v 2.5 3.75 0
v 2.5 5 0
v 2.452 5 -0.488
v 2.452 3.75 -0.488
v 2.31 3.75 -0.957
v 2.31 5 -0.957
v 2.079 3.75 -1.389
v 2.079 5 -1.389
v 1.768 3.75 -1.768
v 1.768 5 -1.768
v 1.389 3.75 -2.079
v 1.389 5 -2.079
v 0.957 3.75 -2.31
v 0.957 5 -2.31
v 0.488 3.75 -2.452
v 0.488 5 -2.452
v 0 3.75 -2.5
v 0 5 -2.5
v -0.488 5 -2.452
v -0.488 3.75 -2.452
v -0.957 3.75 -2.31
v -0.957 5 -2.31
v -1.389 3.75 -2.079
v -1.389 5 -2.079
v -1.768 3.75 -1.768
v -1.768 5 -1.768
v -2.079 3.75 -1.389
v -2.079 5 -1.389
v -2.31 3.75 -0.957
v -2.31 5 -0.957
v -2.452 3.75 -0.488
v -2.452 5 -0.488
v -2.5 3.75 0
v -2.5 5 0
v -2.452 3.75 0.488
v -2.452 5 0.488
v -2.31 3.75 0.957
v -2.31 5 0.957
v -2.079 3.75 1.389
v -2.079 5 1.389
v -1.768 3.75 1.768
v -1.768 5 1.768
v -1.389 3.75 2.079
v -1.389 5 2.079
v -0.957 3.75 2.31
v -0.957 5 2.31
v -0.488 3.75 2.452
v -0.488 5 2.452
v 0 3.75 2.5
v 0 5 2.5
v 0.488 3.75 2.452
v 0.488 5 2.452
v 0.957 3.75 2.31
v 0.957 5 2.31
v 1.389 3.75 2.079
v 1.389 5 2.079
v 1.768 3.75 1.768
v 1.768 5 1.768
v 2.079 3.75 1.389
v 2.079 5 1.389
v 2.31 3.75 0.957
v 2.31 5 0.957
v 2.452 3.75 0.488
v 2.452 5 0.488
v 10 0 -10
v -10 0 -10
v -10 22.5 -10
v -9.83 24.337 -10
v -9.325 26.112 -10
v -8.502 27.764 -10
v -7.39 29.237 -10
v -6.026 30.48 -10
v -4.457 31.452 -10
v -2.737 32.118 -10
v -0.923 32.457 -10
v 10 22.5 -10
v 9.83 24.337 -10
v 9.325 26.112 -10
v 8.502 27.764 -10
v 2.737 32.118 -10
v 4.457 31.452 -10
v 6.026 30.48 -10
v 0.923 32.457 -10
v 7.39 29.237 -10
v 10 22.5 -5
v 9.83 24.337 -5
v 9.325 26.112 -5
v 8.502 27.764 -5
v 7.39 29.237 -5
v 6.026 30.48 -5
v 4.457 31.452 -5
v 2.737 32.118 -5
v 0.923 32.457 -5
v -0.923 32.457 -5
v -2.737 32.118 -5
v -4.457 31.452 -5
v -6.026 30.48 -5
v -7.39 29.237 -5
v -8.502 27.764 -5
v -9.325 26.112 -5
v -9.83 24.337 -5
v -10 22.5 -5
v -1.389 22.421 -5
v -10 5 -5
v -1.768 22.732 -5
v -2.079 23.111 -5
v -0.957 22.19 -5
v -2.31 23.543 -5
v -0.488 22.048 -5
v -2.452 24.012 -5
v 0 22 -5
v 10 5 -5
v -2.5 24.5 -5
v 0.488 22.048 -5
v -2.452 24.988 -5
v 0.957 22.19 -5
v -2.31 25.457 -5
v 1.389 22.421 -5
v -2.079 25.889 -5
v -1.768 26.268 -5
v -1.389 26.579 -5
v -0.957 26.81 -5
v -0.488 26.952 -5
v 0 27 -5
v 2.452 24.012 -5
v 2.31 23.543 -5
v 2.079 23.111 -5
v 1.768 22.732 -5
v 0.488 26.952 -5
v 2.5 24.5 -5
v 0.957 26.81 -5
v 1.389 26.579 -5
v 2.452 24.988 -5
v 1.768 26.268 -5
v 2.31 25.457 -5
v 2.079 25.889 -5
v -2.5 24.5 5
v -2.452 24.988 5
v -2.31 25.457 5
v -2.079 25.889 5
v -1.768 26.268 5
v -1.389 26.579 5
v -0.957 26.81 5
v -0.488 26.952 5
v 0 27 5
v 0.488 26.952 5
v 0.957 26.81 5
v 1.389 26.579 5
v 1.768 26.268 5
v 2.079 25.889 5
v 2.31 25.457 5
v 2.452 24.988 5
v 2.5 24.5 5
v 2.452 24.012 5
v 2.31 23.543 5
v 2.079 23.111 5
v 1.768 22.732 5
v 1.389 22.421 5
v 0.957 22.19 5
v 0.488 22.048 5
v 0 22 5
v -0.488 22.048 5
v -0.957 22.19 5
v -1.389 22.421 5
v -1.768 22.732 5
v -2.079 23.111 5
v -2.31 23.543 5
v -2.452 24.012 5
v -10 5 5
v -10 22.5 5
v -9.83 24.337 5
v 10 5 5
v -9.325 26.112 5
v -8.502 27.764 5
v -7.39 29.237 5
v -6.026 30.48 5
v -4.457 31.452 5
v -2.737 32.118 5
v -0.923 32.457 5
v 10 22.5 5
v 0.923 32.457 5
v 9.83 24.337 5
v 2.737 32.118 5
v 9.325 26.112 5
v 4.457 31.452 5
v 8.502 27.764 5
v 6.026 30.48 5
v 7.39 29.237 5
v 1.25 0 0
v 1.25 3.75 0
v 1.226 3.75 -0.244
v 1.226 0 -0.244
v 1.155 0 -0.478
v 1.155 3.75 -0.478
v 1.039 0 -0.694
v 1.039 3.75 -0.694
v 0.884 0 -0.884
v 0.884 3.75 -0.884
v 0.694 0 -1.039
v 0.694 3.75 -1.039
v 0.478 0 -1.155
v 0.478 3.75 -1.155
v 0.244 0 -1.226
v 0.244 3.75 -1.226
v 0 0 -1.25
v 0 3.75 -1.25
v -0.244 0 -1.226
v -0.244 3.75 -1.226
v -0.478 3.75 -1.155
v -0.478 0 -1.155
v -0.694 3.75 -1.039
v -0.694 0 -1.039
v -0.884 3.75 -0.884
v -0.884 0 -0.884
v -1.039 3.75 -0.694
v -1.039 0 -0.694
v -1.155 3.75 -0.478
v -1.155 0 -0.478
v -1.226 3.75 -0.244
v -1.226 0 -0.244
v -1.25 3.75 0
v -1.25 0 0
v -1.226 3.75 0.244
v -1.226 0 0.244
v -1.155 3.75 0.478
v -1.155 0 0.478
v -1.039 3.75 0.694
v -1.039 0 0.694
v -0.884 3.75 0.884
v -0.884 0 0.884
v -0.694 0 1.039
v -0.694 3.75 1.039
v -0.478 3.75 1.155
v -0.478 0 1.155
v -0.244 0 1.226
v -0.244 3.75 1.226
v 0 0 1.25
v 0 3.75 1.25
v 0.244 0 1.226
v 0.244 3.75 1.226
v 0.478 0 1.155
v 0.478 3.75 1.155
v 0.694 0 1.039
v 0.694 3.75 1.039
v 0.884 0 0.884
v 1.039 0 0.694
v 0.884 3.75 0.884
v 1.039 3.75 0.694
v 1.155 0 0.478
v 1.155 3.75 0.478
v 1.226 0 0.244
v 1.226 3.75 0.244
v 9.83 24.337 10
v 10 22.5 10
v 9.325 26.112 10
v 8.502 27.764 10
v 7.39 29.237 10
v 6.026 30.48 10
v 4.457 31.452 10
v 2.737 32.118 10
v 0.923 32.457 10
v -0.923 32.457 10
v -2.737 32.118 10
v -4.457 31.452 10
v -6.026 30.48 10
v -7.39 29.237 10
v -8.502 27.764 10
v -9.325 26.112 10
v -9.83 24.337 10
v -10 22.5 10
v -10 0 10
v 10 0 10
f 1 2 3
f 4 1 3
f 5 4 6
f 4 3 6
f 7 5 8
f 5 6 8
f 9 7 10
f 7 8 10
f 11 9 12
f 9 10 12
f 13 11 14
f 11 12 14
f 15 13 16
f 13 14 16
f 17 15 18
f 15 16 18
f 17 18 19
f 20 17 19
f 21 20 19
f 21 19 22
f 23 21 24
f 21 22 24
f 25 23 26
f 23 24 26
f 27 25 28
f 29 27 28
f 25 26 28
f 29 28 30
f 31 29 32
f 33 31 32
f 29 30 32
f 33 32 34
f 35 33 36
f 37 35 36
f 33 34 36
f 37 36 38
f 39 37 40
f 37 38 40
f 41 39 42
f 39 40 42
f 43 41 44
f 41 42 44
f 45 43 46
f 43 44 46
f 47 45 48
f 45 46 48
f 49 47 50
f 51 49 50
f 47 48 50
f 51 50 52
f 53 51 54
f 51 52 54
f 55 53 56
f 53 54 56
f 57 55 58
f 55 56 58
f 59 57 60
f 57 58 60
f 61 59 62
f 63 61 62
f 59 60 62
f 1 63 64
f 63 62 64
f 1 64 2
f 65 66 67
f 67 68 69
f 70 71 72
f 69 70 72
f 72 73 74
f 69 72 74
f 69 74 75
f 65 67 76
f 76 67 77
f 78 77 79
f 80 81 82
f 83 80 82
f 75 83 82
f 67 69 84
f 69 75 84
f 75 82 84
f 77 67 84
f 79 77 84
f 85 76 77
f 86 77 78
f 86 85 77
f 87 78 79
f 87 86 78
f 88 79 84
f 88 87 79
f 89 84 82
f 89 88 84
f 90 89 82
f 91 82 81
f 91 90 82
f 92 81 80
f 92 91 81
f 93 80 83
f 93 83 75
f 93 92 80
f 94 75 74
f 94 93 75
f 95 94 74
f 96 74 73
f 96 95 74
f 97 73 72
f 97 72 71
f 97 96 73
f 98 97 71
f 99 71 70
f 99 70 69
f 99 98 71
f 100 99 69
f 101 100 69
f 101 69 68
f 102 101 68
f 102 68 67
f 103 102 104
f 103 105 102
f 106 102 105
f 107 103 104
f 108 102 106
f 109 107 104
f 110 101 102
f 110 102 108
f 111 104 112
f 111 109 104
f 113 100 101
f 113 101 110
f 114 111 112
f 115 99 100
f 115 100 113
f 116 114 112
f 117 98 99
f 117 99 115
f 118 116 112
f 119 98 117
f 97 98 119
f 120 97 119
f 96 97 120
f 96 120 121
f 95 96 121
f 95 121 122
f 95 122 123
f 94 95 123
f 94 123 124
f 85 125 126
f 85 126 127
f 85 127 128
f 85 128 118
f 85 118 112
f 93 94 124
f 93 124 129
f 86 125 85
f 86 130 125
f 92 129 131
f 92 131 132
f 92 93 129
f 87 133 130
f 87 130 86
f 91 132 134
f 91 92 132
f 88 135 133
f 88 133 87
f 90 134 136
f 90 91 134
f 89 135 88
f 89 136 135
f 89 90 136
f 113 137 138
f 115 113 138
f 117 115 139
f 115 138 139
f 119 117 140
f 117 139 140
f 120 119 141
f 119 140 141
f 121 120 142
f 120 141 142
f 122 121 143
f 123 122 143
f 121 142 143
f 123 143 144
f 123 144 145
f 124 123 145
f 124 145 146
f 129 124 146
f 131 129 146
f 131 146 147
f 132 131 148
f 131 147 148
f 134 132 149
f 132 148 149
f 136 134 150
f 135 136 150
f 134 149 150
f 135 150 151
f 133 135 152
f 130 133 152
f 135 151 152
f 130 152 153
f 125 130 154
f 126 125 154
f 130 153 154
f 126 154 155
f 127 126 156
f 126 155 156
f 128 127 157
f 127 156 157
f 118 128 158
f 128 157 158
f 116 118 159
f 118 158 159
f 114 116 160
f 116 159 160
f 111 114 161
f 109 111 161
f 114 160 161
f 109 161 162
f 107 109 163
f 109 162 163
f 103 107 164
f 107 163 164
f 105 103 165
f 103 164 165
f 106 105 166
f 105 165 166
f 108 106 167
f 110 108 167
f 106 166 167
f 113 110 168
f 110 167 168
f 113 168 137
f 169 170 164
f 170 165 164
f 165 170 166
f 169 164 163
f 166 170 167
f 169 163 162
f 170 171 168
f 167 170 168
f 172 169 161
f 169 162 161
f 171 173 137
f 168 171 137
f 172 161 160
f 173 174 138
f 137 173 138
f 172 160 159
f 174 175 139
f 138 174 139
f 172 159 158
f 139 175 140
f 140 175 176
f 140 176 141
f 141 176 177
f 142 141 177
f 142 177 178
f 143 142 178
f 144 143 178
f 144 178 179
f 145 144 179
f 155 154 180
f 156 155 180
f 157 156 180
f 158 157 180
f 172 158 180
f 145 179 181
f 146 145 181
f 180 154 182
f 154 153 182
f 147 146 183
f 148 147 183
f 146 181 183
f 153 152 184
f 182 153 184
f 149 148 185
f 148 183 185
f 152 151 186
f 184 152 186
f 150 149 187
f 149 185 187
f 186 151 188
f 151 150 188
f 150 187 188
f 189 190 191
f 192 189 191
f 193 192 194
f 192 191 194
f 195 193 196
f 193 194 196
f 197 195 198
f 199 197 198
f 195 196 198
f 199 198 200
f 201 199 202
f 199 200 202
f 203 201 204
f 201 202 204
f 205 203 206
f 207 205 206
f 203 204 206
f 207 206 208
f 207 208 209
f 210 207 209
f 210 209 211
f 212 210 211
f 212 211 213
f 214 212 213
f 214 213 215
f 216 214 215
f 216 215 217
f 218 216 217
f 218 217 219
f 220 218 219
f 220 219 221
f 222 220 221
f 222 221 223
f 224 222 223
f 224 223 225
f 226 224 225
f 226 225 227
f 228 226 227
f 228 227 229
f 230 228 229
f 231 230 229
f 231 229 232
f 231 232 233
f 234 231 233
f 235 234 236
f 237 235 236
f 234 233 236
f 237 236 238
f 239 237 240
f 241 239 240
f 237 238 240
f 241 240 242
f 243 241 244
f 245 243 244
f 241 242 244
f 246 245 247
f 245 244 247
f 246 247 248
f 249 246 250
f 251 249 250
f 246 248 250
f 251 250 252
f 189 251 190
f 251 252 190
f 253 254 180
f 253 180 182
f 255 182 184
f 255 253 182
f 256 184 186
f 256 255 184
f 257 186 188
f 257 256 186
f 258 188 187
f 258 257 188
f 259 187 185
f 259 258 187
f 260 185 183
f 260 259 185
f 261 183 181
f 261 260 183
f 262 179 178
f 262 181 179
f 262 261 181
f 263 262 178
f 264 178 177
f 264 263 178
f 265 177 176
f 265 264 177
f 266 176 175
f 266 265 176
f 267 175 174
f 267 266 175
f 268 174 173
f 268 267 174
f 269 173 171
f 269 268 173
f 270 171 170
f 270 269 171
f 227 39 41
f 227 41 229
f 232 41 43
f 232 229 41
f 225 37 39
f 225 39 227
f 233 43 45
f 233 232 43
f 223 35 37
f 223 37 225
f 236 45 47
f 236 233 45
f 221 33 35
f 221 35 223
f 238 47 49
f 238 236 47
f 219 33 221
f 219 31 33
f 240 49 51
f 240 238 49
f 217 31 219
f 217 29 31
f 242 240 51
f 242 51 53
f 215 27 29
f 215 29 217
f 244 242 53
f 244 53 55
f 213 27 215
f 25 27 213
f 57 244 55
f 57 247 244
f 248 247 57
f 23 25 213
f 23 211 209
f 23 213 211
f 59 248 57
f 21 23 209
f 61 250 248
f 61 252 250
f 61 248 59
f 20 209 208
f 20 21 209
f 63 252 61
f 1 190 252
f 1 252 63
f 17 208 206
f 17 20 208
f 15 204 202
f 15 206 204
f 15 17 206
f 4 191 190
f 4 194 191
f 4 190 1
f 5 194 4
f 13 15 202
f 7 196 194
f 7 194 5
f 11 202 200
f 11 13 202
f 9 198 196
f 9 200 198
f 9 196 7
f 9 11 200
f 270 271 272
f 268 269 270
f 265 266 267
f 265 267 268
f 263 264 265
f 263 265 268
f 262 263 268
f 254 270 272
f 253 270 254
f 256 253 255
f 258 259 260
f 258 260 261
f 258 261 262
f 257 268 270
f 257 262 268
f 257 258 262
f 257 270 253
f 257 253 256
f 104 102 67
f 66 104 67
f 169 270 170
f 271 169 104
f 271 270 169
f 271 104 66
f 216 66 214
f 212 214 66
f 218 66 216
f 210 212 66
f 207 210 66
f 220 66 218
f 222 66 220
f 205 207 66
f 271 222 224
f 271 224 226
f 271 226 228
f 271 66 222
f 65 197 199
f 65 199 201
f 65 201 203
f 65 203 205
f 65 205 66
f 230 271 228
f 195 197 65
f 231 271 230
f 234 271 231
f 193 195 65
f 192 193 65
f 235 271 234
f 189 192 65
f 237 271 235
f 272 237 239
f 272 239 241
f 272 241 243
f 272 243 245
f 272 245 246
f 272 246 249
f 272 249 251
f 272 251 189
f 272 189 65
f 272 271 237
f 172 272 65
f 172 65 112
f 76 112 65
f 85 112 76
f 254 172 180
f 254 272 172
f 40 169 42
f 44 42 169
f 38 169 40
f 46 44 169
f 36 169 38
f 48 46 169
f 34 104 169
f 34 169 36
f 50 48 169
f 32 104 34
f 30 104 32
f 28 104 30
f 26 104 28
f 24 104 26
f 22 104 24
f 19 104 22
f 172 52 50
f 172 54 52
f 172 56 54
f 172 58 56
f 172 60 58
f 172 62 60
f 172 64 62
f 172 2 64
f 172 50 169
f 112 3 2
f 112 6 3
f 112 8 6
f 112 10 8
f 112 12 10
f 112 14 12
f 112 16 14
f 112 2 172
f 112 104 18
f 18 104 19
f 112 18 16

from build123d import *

# Parameters (mm, degrees)
BOSS_EXTRUDE1_DEPTH = 10
SKETCH3_W           = 20
SKETCH3_H           = 10
CUT_EXTRUDE2_DEPTH  = 27.5
SKETCH4_R           = 2.5
BOSS_EXTRUDE2_DEPTH = 10
SKETCH5_R           = 1.25
CUT_EXTRUDE4_DEPTH  = 10
SKETCH6_R           = 2.5
CUT_EXTRUDE5_DEPTH  = 1.25


with BuildPart() as part:
    # Sketch1 → Boss-Extrude1 (new body, symmetric)
    with BuildSketch(Plane.XY):
        with BuildLine():
            Line((-10, 22.5), (-10, 0))
            Line((-10, 0), (10, 0))
            Line((10, 0), (10, 22.5))
            ThreePointArc((10, 22.5), (0, 32.5), (-10, 22.5))
        make_face()
    extrude(amount=BOSS_EXTRUDE1_DEPTH, both=True)

    # Sketch3 → Cut-Extrude2 (cut)
    with BuildSketch(Plane(origin=(0, 32.5, 0), x_dir=(1, 0, 0), z_dir=(0, 1, 0))):
        Rectangle(SKETCH3_W, SKETCH3_H)
    extrude(amount=-CUT_EXTRUDE2_DEPTH, mode=Mode.SUBTRACT)

    # Sketch4 → Boss-Extrude2 (add)
    with BuildSketch(Plane(origin=(0, 0, 5), x_dir=(-1, 0, 0), z_dir=(0, 0, -1))):
        with Locations((0, 24.5)):
            Circle(SKETCH4_R)
    extrude(amount=BOSS_EXTRUDE2_DEPTH)

    # Sketch5 → Cut-Extrude4 (cut)
    with BuildSketch(Plane(origin=(0, 5, 0), x_dir=(1, 0, 0), z_dir=(0, 1, 0))):
        Circle(SKETCH5_R)
    extrude(amount=-CUT_EXTRUDE4_DEPTH, mode=Mode.SUBTRACT)

    # Sketch6 → Cut-Extrude5 (cut)
    with BuildSketch(Plane(origin=(0, 5, 0), x_dir=(1, 0, 0), z_dir=(0, 1, 0))):
        Circle(SKETCH6_R)
    extrude(amount=-CUT_EXTRUDE5_DEPTH, mode=Mode.SUBTRACT)


solid = part.part
